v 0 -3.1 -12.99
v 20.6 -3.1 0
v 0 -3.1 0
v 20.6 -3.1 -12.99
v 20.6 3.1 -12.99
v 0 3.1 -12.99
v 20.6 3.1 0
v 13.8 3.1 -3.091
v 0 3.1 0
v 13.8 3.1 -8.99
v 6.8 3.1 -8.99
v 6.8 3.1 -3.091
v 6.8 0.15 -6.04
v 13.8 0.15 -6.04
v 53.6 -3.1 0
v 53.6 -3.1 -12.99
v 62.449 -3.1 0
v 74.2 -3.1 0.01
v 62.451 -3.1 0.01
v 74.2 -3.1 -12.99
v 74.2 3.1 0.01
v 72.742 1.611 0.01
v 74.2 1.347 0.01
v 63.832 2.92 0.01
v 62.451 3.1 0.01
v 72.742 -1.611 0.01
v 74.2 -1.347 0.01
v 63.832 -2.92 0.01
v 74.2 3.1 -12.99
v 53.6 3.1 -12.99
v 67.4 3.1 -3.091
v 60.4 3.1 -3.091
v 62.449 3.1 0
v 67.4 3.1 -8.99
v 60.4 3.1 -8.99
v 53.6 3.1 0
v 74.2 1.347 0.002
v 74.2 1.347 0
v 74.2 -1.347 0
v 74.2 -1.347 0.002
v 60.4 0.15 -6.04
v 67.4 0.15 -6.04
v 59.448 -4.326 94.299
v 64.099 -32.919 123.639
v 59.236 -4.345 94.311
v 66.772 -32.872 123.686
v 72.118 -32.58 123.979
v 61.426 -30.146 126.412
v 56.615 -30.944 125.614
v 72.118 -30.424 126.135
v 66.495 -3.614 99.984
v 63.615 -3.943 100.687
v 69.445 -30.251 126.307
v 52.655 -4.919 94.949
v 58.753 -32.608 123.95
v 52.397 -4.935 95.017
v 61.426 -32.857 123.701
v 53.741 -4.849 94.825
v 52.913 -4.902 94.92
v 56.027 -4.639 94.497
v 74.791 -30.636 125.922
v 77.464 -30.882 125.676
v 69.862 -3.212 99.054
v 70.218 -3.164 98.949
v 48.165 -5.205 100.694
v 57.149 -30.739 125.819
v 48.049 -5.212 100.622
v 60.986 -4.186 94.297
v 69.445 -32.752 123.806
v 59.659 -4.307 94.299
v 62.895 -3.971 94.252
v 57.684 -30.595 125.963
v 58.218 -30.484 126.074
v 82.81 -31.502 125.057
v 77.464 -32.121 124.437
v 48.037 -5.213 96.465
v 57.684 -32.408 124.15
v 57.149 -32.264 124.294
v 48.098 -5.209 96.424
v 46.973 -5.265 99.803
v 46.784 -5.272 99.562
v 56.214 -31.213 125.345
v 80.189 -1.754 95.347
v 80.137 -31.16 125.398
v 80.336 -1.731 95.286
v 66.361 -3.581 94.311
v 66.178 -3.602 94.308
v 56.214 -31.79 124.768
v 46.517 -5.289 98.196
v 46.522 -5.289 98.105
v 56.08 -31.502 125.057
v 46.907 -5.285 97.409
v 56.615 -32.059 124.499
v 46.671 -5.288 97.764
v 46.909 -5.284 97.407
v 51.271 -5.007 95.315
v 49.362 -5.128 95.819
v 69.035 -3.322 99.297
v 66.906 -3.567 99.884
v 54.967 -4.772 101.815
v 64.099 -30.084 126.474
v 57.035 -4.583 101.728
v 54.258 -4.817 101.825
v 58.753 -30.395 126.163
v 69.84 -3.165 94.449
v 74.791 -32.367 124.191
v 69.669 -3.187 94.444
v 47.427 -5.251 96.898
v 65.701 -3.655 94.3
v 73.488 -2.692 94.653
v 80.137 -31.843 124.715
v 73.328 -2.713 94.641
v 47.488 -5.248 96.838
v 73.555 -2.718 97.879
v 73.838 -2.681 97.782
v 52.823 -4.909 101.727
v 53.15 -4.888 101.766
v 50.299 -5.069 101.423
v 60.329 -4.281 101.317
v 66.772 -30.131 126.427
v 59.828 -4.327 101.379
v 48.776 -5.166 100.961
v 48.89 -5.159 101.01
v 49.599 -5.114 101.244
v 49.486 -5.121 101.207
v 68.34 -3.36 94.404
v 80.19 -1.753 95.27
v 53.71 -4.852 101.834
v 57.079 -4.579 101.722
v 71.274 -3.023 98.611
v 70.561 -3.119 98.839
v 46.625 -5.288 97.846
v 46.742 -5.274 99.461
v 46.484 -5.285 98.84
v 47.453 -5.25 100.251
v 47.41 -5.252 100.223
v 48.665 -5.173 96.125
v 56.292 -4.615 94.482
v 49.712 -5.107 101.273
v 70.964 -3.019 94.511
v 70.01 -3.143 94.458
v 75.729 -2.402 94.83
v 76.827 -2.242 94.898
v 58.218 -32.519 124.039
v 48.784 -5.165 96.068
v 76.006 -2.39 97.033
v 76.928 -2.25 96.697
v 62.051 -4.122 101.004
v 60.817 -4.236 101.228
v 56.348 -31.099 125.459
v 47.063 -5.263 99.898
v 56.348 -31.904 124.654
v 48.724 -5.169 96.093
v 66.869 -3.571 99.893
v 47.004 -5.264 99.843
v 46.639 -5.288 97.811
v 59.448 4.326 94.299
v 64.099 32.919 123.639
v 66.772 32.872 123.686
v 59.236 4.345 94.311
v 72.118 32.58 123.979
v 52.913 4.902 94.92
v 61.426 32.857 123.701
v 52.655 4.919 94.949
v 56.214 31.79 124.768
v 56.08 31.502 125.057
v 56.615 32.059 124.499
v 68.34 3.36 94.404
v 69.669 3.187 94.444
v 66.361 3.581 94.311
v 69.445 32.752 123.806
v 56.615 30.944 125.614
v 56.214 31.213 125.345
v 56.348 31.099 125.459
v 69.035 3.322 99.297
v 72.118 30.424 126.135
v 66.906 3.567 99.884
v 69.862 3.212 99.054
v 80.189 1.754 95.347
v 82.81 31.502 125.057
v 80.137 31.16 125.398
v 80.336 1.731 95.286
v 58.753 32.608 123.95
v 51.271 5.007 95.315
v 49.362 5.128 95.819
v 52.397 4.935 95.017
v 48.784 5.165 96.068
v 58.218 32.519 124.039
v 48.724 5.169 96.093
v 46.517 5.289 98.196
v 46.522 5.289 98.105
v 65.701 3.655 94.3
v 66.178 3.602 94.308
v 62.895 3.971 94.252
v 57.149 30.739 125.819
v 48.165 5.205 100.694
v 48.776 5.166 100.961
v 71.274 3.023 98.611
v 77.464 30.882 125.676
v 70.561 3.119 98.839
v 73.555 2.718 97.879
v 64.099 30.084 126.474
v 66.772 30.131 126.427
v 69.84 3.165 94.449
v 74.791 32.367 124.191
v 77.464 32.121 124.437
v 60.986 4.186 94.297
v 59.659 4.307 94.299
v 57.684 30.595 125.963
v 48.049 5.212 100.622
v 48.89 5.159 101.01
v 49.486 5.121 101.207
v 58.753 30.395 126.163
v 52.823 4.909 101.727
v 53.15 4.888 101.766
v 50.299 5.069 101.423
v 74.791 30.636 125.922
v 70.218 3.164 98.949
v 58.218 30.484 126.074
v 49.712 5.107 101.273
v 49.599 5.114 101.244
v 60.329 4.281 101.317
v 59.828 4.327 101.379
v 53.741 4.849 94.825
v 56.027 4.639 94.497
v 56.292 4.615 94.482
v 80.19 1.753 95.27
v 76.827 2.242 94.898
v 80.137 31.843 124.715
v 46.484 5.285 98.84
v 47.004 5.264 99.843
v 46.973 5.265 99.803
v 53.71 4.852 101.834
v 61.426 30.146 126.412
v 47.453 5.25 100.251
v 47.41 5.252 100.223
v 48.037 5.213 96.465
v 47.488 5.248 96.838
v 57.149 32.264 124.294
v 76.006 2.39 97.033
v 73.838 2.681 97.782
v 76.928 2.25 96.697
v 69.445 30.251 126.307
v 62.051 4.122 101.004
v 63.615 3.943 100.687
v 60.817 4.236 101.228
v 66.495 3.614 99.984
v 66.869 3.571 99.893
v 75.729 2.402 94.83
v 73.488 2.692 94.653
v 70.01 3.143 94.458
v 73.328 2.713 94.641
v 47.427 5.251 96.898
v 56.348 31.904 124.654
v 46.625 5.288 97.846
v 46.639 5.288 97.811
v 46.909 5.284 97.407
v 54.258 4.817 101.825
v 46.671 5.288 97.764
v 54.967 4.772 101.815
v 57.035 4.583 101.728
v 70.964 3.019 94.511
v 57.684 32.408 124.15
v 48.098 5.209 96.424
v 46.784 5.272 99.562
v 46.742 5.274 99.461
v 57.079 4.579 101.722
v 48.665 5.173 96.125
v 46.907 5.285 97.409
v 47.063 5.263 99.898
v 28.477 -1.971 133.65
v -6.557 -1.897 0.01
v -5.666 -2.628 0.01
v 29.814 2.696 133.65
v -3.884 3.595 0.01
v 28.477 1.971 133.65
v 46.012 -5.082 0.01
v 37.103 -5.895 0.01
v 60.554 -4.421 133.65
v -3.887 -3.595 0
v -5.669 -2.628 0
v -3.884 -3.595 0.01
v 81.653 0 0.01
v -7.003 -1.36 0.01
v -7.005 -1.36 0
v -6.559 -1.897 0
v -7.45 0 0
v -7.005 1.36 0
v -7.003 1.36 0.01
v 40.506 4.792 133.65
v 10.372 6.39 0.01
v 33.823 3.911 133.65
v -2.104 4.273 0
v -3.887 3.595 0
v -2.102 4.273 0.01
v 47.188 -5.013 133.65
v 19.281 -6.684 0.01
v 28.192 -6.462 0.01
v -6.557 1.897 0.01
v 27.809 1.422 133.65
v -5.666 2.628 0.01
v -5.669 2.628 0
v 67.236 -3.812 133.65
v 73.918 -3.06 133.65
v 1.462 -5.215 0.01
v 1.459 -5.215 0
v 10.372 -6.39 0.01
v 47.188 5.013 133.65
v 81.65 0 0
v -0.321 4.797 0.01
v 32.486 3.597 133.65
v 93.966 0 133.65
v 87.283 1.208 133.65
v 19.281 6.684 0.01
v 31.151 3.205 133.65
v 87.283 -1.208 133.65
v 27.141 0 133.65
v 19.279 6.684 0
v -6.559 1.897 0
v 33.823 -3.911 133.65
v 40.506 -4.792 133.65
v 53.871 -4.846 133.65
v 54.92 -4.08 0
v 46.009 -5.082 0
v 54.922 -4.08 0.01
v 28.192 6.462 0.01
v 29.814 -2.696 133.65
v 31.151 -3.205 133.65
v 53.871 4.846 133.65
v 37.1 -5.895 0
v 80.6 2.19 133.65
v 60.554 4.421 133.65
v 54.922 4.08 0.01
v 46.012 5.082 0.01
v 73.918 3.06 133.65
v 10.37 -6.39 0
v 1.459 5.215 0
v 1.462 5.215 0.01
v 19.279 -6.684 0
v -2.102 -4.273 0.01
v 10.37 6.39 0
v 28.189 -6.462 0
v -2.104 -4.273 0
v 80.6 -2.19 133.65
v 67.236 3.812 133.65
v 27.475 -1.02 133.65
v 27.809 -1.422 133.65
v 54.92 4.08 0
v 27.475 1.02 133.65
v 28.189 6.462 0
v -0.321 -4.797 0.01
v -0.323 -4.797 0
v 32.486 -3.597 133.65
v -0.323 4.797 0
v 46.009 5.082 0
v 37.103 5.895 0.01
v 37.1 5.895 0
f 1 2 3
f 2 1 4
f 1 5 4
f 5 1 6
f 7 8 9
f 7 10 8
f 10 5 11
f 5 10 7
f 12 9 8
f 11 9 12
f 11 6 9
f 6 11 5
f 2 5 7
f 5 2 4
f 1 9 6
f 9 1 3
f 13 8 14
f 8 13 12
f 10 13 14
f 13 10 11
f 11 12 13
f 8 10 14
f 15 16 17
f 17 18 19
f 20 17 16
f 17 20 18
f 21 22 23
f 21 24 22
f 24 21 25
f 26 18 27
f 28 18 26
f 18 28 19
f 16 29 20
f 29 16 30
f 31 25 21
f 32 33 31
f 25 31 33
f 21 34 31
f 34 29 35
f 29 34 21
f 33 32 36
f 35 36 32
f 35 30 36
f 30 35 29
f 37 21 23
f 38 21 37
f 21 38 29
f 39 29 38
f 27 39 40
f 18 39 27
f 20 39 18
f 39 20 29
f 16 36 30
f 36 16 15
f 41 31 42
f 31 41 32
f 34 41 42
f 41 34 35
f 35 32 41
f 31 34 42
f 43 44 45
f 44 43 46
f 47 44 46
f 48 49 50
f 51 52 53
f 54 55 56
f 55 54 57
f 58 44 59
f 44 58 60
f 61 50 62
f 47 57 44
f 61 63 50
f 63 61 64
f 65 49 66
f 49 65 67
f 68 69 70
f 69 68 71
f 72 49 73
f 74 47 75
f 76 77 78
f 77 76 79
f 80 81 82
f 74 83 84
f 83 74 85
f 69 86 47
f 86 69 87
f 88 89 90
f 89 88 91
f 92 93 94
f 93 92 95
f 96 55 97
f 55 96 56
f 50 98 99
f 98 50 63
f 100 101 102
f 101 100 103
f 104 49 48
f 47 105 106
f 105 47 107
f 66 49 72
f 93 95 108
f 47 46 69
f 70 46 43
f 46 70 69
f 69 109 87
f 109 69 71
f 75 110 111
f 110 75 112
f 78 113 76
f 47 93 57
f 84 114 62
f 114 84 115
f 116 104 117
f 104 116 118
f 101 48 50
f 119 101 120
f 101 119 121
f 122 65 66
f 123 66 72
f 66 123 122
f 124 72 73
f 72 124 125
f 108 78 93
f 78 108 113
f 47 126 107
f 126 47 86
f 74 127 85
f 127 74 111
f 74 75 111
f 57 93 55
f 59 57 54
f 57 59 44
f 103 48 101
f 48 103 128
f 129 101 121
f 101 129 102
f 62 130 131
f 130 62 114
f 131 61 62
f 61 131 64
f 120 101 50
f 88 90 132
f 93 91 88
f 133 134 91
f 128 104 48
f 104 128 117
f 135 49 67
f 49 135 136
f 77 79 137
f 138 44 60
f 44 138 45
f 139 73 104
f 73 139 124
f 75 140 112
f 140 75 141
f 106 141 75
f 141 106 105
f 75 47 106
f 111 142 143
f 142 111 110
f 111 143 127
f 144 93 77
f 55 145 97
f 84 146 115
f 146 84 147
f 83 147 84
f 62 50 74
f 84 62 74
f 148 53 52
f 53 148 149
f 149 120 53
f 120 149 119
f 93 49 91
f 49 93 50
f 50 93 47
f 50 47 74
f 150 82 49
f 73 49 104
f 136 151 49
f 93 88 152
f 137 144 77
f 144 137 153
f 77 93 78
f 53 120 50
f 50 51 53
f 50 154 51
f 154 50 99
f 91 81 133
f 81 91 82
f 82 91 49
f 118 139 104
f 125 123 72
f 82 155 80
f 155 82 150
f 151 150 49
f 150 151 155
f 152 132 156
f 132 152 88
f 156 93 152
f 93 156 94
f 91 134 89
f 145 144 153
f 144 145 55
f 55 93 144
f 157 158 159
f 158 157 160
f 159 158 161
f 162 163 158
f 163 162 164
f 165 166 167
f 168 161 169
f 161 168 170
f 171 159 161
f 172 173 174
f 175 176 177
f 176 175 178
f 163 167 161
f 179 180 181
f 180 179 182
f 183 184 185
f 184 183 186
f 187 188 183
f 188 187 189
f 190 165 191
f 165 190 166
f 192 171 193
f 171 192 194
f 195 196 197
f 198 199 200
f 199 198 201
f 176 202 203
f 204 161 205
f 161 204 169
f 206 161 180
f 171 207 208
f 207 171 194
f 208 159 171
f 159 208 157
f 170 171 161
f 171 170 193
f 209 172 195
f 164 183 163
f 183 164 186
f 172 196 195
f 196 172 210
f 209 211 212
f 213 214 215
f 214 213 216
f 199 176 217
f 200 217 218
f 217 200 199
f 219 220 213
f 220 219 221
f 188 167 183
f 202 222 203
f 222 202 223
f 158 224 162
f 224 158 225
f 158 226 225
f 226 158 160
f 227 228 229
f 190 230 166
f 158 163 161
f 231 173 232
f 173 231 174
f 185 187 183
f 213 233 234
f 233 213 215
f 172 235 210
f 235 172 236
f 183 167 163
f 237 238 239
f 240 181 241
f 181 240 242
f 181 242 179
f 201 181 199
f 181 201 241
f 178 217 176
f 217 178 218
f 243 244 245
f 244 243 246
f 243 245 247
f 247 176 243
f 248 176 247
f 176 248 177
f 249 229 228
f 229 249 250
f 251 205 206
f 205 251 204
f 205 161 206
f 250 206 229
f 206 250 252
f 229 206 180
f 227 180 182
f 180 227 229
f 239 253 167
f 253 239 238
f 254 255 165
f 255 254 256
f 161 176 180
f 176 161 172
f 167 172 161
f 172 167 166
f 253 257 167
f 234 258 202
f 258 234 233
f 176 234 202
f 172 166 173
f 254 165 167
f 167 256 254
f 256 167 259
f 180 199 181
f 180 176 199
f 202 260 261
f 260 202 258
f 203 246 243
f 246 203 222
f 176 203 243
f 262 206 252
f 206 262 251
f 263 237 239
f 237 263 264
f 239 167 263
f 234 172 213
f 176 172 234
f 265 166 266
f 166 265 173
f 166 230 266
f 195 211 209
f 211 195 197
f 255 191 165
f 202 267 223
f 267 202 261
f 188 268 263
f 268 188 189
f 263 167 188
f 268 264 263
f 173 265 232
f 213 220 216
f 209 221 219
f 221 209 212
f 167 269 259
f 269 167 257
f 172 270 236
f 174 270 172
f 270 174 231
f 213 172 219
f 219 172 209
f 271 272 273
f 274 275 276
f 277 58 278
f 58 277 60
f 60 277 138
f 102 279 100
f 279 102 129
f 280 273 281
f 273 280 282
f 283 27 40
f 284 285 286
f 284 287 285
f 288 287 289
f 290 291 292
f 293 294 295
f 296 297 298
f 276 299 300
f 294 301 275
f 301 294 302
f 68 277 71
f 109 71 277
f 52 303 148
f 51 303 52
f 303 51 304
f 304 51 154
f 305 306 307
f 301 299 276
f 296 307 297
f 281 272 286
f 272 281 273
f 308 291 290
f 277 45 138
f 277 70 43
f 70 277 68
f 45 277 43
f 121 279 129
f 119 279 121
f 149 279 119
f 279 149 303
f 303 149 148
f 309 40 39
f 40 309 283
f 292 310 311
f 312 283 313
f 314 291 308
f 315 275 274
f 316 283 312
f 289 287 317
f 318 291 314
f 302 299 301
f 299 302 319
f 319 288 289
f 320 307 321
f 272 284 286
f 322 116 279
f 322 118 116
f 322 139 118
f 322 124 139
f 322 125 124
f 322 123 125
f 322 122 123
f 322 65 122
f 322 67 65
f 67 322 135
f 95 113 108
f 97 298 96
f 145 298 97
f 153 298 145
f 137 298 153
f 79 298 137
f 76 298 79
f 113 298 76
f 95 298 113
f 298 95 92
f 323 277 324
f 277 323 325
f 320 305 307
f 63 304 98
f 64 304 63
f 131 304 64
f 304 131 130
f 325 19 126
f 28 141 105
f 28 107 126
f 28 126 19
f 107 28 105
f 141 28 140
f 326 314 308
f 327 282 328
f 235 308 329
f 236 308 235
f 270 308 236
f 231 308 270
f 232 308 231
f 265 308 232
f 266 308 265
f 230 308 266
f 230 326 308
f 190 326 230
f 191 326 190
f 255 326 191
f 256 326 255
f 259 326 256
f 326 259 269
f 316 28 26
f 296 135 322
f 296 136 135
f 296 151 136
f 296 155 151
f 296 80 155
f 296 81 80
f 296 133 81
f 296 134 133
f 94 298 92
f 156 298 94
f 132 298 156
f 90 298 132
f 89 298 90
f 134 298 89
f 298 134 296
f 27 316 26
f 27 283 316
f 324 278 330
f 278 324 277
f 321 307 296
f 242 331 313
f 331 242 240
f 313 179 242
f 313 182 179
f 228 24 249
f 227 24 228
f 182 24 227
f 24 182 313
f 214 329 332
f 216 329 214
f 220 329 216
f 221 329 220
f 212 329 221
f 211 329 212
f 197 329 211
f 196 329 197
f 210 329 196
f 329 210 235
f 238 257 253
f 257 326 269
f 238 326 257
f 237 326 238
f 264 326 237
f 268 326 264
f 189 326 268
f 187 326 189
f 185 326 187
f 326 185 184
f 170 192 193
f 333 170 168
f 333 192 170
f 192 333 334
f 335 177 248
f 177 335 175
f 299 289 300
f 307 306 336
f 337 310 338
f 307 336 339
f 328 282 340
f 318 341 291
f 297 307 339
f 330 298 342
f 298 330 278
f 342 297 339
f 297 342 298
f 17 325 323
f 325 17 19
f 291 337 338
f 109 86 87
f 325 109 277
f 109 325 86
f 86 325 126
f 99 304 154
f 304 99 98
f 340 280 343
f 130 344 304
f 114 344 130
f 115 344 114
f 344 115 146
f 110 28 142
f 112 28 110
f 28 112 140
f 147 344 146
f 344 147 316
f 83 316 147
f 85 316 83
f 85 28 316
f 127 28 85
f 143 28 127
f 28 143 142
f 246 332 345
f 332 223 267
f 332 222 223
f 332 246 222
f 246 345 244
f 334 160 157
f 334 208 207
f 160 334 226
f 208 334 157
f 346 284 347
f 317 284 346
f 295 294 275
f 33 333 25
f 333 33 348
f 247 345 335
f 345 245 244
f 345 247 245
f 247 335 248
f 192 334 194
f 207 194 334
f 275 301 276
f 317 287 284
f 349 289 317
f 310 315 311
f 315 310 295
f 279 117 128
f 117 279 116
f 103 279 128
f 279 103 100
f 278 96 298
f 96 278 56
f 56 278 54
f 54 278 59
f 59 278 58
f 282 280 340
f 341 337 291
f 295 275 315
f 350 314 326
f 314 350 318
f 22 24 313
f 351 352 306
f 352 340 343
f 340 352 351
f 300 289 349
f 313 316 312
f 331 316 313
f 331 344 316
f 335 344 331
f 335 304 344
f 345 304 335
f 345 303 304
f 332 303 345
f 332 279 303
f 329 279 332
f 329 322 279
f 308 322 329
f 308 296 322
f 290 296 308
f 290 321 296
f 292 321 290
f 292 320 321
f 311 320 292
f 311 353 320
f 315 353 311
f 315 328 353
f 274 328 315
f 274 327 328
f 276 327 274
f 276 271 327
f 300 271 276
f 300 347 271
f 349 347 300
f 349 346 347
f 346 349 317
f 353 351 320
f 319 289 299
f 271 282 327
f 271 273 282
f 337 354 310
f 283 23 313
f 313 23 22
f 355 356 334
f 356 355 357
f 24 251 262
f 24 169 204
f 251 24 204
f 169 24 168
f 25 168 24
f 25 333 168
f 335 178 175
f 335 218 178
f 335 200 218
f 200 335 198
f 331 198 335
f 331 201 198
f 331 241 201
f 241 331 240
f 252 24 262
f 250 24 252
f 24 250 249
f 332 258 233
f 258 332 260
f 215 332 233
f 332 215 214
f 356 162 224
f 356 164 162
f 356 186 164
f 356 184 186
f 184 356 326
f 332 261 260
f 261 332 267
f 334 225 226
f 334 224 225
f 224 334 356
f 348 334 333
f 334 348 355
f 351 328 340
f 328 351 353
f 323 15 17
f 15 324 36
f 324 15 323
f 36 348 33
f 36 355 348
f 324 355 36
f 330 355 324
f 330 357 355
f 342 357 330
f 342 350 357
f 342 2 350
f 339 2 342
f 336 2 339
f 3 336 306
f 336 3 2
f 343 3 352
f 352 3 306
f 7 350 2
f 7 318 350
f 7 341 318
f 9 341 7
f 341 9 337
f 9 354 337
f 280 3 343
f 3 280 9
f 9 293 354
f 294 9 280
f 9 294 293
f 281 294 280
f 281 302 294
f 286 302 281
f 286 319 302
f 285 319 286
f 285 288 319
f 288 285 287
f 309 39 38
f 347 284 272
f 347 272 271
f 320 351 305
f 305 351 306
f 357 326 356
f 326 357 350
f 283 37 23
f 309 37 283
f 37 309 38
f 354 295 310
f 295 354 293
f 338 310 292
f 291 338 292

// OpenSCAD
// file: naca.scad
// Parametric NACA 00xx airfoil.
// See http://en.wikipedia.org/wiki/NACA_airfoil

// Percentage of chord length at max width.
t = 0.15;

E = 0.01;

function y(x) = t / 0.2 *
         (.2969 * sqrt(x)
          -0.1260 * x
          -0.3516 * pow(x, 2)
          +0.2843 * pow(x, 3)
          -0.1015 * pow(x, 4));

// Argh!  No for loop initializer in open scad!
a = [[0.0, y(0.0)],
     [0.005, y(0.005)],
     [0.01, y(0.01)],
     [0.02, y(0.02)], [0.04, y(0.04)], [0.06, y(0.06)], [0.08, y(0.08)],
     [0.1, y(0.1)],
     [0.2, y(0.2)],
     [0.3, y(0.3)],
     [0.4, y(0.4)],
     [0.5, y(0.5)],
     [0.6, y(0.6)],
     [0.7, y(0.7)],
     [0.8, y(0.8)],
     [0.9, y(0.9)],
     [1.0, y(1.0)],
     [0.9, -y(0.9)],
     [0.8, -y(0.8)],
     [0.7, -y(0.7)],
     [0.6, -y(0.6)],
     [0.5, -y(0.5)],
     [0.4, -y(0.4)],
     [0.3, -y(0.3)],
     [0.2, -y(0.2)],
     [0.1, -y(0.1)],
     [0.08, -y(0.08)], [0.06, -y(0.06)], [0.04, -y(0.04)], [0.02, -y(0.02)],
     [0.01, -y(0.01)],
     [0.005, -y(0.005)],
     [0.0, -y(0.0)]
     ];

module naca_2d(chord) {
  scale([chord, chord, 1])
    polygon(points=a);
}

module reflect_z() {
  multmatrix(m=[[1, 0, 0, 0],
                [0, 1, 0, 0],
                [0, 0, -1, 0],
                [0, 0, 0, 1]])
    child(0);
}

module naca(chord, length, taper=1, sweep_ang=0) {
  sweep = sin(sweep_ang);
  multmatrix(m=[ [1, 0, sweep, 0],
                 [0, 1, 0, 0],
                 [0, 0, 1, 0],
                 [0, 0, 0, 1]
               ])
   hull() {
     linear_extrude(height=E)
       naca_2d(chord);
     translate([0, 0, length - E])
       scale([taper, taper, 1])
         linear_extrude(height=E)
           naca_2d(chord);
  }
}

naca(50, 150, taper=0.5, sweep_ang=20);
reflect_z()
  naca(50, 150, taper=0.5, sweep_ang=20);
// main file
use <naca.scad>;

PART = "foil"; // [eliptical, foil, box]

TAB_X = 6.2;
TAB_Y = 20.6;
TAB_Z = 13.0;
TAB_SPACING = 33.0;
TAB_CENTER = TAB_Y + TAB_SPACING / 2;
TAB_DENT = 7.0;

FIN_BASE = 89.1;
FIN_HEIGHT = 74.0;
FIN_WIDTH = 6.4;
FIN_LENGTH = 100.0;
FIN_RADIUS = 400.0;


// Epsilon
E = 0.01;

module eliptical_fin() {
  tabs();
  translate([0, TAB_CENTER, 0])
    center_eliptical();
}

module box_fin() {
   tabs();
   difference() {
     translate([0, TAB_CENTER, 0])
        center_box();
     via();
     translate([0, TAB_SPACING + TAB_Y, 0])
       via();
   }
}

module foil_fin() {
  rotate(a=-90, v=[0, 0, 1])
    tabs();
  translate([TAB_CENTER - FIN_BASE / 2, 0, 0])
    naca(FIN_BASE, FIN_BASE * 1.5, taper=0.75, sweep_ang=15);
  translate([FIN_BASE * 0.5, 0, FIN_BASE * 1.5 * 0.7])
    union() {
      winglet();
      reflect_y() winglet();
    }
}

module winglet() {
  rotate(a=45, v=[1, 0, 0])
    naca(FIN_BASE * .4, FIN_BASE * .5, taper=0.75, sweep_ang=15);
}

module reflect_y() {
  multmatrix(m=[[1, 0, 0, 0],
                [0, -1, 0, 0],
                [0, 0, 1, 0],
                [0, 0, 0, 1]])
    child(0);
}

module via() {
  translate([0, 0, -2])
    rotate(a=45, v=[0, 1, 0])
    translate([0, (TAB_Y - TAB_DENT) / 2, 0])
    cube([TAB_DENT, TAB_DENT, FIN_HEIGHT]);
}

module center_box(channels=2) {
  width = FIN_WIDTH * (3 * channels + 1);
  difference () {
    translate([-width / 2, -FIN_LENGTH / 2, 0])
      cube([width, FIN_LENGTH, FIN_HEIGHT / (channels + 1) + 2 * FIN_WIDTH]);
    for (c = [1: channels]) {
      translate([FIN_WIDTH / 2 - (channels - c) * (FIN_WIDTH * 3), -FIN_LENGTH / 2 - E, FIN_WIDTH])
        cube([FIN_WIDTH * 2, FIN_LENGTH + 2 * E, FIN_HEIGHT / (channels + 1)]);
    }
  }
}

module tabs() {
  translate([0, 0, E]) {
    tab();
    translate([0, TAB_Y + TAB_SPACING, 0])
      tab();
  }
}

module tab() {
   translate([-TAB_X / 2, 0, -TAB_Z])
     difference () {
       cube([TAB_X, TAB_Y, TAB_Z]);
       translate([-2, TAB_Y / 2 - TAB_DENT / 2, 2])
         rotate(a=-45, v=[0, 1, 0])
           cube(size=TAB_DENT);
    }
}

module center_eliptical() {
  intersection() {
    scale([FIN_WIDTH / FIN_LENGTH, 1, 1])
      cylinder(r=FIN_LENGTH / 2, h=FIN_HEIGHT);
/*
    scale([FIN_WIDTH / FIN_HEIGHT / 2, 1, 1])
      translate([0, FIN_LENGTH / 2, 0])
        rotate(a=90, v=[1, 0, 0])
          cylinder(r=FIN_HEIGHT, h=FIN_LENGTH + E);
*/
  }
}

if (PART == "eliptical") eliptical_fin();
if (PART == "foil") foil_fin();
if (PART == "box") box_fin();
